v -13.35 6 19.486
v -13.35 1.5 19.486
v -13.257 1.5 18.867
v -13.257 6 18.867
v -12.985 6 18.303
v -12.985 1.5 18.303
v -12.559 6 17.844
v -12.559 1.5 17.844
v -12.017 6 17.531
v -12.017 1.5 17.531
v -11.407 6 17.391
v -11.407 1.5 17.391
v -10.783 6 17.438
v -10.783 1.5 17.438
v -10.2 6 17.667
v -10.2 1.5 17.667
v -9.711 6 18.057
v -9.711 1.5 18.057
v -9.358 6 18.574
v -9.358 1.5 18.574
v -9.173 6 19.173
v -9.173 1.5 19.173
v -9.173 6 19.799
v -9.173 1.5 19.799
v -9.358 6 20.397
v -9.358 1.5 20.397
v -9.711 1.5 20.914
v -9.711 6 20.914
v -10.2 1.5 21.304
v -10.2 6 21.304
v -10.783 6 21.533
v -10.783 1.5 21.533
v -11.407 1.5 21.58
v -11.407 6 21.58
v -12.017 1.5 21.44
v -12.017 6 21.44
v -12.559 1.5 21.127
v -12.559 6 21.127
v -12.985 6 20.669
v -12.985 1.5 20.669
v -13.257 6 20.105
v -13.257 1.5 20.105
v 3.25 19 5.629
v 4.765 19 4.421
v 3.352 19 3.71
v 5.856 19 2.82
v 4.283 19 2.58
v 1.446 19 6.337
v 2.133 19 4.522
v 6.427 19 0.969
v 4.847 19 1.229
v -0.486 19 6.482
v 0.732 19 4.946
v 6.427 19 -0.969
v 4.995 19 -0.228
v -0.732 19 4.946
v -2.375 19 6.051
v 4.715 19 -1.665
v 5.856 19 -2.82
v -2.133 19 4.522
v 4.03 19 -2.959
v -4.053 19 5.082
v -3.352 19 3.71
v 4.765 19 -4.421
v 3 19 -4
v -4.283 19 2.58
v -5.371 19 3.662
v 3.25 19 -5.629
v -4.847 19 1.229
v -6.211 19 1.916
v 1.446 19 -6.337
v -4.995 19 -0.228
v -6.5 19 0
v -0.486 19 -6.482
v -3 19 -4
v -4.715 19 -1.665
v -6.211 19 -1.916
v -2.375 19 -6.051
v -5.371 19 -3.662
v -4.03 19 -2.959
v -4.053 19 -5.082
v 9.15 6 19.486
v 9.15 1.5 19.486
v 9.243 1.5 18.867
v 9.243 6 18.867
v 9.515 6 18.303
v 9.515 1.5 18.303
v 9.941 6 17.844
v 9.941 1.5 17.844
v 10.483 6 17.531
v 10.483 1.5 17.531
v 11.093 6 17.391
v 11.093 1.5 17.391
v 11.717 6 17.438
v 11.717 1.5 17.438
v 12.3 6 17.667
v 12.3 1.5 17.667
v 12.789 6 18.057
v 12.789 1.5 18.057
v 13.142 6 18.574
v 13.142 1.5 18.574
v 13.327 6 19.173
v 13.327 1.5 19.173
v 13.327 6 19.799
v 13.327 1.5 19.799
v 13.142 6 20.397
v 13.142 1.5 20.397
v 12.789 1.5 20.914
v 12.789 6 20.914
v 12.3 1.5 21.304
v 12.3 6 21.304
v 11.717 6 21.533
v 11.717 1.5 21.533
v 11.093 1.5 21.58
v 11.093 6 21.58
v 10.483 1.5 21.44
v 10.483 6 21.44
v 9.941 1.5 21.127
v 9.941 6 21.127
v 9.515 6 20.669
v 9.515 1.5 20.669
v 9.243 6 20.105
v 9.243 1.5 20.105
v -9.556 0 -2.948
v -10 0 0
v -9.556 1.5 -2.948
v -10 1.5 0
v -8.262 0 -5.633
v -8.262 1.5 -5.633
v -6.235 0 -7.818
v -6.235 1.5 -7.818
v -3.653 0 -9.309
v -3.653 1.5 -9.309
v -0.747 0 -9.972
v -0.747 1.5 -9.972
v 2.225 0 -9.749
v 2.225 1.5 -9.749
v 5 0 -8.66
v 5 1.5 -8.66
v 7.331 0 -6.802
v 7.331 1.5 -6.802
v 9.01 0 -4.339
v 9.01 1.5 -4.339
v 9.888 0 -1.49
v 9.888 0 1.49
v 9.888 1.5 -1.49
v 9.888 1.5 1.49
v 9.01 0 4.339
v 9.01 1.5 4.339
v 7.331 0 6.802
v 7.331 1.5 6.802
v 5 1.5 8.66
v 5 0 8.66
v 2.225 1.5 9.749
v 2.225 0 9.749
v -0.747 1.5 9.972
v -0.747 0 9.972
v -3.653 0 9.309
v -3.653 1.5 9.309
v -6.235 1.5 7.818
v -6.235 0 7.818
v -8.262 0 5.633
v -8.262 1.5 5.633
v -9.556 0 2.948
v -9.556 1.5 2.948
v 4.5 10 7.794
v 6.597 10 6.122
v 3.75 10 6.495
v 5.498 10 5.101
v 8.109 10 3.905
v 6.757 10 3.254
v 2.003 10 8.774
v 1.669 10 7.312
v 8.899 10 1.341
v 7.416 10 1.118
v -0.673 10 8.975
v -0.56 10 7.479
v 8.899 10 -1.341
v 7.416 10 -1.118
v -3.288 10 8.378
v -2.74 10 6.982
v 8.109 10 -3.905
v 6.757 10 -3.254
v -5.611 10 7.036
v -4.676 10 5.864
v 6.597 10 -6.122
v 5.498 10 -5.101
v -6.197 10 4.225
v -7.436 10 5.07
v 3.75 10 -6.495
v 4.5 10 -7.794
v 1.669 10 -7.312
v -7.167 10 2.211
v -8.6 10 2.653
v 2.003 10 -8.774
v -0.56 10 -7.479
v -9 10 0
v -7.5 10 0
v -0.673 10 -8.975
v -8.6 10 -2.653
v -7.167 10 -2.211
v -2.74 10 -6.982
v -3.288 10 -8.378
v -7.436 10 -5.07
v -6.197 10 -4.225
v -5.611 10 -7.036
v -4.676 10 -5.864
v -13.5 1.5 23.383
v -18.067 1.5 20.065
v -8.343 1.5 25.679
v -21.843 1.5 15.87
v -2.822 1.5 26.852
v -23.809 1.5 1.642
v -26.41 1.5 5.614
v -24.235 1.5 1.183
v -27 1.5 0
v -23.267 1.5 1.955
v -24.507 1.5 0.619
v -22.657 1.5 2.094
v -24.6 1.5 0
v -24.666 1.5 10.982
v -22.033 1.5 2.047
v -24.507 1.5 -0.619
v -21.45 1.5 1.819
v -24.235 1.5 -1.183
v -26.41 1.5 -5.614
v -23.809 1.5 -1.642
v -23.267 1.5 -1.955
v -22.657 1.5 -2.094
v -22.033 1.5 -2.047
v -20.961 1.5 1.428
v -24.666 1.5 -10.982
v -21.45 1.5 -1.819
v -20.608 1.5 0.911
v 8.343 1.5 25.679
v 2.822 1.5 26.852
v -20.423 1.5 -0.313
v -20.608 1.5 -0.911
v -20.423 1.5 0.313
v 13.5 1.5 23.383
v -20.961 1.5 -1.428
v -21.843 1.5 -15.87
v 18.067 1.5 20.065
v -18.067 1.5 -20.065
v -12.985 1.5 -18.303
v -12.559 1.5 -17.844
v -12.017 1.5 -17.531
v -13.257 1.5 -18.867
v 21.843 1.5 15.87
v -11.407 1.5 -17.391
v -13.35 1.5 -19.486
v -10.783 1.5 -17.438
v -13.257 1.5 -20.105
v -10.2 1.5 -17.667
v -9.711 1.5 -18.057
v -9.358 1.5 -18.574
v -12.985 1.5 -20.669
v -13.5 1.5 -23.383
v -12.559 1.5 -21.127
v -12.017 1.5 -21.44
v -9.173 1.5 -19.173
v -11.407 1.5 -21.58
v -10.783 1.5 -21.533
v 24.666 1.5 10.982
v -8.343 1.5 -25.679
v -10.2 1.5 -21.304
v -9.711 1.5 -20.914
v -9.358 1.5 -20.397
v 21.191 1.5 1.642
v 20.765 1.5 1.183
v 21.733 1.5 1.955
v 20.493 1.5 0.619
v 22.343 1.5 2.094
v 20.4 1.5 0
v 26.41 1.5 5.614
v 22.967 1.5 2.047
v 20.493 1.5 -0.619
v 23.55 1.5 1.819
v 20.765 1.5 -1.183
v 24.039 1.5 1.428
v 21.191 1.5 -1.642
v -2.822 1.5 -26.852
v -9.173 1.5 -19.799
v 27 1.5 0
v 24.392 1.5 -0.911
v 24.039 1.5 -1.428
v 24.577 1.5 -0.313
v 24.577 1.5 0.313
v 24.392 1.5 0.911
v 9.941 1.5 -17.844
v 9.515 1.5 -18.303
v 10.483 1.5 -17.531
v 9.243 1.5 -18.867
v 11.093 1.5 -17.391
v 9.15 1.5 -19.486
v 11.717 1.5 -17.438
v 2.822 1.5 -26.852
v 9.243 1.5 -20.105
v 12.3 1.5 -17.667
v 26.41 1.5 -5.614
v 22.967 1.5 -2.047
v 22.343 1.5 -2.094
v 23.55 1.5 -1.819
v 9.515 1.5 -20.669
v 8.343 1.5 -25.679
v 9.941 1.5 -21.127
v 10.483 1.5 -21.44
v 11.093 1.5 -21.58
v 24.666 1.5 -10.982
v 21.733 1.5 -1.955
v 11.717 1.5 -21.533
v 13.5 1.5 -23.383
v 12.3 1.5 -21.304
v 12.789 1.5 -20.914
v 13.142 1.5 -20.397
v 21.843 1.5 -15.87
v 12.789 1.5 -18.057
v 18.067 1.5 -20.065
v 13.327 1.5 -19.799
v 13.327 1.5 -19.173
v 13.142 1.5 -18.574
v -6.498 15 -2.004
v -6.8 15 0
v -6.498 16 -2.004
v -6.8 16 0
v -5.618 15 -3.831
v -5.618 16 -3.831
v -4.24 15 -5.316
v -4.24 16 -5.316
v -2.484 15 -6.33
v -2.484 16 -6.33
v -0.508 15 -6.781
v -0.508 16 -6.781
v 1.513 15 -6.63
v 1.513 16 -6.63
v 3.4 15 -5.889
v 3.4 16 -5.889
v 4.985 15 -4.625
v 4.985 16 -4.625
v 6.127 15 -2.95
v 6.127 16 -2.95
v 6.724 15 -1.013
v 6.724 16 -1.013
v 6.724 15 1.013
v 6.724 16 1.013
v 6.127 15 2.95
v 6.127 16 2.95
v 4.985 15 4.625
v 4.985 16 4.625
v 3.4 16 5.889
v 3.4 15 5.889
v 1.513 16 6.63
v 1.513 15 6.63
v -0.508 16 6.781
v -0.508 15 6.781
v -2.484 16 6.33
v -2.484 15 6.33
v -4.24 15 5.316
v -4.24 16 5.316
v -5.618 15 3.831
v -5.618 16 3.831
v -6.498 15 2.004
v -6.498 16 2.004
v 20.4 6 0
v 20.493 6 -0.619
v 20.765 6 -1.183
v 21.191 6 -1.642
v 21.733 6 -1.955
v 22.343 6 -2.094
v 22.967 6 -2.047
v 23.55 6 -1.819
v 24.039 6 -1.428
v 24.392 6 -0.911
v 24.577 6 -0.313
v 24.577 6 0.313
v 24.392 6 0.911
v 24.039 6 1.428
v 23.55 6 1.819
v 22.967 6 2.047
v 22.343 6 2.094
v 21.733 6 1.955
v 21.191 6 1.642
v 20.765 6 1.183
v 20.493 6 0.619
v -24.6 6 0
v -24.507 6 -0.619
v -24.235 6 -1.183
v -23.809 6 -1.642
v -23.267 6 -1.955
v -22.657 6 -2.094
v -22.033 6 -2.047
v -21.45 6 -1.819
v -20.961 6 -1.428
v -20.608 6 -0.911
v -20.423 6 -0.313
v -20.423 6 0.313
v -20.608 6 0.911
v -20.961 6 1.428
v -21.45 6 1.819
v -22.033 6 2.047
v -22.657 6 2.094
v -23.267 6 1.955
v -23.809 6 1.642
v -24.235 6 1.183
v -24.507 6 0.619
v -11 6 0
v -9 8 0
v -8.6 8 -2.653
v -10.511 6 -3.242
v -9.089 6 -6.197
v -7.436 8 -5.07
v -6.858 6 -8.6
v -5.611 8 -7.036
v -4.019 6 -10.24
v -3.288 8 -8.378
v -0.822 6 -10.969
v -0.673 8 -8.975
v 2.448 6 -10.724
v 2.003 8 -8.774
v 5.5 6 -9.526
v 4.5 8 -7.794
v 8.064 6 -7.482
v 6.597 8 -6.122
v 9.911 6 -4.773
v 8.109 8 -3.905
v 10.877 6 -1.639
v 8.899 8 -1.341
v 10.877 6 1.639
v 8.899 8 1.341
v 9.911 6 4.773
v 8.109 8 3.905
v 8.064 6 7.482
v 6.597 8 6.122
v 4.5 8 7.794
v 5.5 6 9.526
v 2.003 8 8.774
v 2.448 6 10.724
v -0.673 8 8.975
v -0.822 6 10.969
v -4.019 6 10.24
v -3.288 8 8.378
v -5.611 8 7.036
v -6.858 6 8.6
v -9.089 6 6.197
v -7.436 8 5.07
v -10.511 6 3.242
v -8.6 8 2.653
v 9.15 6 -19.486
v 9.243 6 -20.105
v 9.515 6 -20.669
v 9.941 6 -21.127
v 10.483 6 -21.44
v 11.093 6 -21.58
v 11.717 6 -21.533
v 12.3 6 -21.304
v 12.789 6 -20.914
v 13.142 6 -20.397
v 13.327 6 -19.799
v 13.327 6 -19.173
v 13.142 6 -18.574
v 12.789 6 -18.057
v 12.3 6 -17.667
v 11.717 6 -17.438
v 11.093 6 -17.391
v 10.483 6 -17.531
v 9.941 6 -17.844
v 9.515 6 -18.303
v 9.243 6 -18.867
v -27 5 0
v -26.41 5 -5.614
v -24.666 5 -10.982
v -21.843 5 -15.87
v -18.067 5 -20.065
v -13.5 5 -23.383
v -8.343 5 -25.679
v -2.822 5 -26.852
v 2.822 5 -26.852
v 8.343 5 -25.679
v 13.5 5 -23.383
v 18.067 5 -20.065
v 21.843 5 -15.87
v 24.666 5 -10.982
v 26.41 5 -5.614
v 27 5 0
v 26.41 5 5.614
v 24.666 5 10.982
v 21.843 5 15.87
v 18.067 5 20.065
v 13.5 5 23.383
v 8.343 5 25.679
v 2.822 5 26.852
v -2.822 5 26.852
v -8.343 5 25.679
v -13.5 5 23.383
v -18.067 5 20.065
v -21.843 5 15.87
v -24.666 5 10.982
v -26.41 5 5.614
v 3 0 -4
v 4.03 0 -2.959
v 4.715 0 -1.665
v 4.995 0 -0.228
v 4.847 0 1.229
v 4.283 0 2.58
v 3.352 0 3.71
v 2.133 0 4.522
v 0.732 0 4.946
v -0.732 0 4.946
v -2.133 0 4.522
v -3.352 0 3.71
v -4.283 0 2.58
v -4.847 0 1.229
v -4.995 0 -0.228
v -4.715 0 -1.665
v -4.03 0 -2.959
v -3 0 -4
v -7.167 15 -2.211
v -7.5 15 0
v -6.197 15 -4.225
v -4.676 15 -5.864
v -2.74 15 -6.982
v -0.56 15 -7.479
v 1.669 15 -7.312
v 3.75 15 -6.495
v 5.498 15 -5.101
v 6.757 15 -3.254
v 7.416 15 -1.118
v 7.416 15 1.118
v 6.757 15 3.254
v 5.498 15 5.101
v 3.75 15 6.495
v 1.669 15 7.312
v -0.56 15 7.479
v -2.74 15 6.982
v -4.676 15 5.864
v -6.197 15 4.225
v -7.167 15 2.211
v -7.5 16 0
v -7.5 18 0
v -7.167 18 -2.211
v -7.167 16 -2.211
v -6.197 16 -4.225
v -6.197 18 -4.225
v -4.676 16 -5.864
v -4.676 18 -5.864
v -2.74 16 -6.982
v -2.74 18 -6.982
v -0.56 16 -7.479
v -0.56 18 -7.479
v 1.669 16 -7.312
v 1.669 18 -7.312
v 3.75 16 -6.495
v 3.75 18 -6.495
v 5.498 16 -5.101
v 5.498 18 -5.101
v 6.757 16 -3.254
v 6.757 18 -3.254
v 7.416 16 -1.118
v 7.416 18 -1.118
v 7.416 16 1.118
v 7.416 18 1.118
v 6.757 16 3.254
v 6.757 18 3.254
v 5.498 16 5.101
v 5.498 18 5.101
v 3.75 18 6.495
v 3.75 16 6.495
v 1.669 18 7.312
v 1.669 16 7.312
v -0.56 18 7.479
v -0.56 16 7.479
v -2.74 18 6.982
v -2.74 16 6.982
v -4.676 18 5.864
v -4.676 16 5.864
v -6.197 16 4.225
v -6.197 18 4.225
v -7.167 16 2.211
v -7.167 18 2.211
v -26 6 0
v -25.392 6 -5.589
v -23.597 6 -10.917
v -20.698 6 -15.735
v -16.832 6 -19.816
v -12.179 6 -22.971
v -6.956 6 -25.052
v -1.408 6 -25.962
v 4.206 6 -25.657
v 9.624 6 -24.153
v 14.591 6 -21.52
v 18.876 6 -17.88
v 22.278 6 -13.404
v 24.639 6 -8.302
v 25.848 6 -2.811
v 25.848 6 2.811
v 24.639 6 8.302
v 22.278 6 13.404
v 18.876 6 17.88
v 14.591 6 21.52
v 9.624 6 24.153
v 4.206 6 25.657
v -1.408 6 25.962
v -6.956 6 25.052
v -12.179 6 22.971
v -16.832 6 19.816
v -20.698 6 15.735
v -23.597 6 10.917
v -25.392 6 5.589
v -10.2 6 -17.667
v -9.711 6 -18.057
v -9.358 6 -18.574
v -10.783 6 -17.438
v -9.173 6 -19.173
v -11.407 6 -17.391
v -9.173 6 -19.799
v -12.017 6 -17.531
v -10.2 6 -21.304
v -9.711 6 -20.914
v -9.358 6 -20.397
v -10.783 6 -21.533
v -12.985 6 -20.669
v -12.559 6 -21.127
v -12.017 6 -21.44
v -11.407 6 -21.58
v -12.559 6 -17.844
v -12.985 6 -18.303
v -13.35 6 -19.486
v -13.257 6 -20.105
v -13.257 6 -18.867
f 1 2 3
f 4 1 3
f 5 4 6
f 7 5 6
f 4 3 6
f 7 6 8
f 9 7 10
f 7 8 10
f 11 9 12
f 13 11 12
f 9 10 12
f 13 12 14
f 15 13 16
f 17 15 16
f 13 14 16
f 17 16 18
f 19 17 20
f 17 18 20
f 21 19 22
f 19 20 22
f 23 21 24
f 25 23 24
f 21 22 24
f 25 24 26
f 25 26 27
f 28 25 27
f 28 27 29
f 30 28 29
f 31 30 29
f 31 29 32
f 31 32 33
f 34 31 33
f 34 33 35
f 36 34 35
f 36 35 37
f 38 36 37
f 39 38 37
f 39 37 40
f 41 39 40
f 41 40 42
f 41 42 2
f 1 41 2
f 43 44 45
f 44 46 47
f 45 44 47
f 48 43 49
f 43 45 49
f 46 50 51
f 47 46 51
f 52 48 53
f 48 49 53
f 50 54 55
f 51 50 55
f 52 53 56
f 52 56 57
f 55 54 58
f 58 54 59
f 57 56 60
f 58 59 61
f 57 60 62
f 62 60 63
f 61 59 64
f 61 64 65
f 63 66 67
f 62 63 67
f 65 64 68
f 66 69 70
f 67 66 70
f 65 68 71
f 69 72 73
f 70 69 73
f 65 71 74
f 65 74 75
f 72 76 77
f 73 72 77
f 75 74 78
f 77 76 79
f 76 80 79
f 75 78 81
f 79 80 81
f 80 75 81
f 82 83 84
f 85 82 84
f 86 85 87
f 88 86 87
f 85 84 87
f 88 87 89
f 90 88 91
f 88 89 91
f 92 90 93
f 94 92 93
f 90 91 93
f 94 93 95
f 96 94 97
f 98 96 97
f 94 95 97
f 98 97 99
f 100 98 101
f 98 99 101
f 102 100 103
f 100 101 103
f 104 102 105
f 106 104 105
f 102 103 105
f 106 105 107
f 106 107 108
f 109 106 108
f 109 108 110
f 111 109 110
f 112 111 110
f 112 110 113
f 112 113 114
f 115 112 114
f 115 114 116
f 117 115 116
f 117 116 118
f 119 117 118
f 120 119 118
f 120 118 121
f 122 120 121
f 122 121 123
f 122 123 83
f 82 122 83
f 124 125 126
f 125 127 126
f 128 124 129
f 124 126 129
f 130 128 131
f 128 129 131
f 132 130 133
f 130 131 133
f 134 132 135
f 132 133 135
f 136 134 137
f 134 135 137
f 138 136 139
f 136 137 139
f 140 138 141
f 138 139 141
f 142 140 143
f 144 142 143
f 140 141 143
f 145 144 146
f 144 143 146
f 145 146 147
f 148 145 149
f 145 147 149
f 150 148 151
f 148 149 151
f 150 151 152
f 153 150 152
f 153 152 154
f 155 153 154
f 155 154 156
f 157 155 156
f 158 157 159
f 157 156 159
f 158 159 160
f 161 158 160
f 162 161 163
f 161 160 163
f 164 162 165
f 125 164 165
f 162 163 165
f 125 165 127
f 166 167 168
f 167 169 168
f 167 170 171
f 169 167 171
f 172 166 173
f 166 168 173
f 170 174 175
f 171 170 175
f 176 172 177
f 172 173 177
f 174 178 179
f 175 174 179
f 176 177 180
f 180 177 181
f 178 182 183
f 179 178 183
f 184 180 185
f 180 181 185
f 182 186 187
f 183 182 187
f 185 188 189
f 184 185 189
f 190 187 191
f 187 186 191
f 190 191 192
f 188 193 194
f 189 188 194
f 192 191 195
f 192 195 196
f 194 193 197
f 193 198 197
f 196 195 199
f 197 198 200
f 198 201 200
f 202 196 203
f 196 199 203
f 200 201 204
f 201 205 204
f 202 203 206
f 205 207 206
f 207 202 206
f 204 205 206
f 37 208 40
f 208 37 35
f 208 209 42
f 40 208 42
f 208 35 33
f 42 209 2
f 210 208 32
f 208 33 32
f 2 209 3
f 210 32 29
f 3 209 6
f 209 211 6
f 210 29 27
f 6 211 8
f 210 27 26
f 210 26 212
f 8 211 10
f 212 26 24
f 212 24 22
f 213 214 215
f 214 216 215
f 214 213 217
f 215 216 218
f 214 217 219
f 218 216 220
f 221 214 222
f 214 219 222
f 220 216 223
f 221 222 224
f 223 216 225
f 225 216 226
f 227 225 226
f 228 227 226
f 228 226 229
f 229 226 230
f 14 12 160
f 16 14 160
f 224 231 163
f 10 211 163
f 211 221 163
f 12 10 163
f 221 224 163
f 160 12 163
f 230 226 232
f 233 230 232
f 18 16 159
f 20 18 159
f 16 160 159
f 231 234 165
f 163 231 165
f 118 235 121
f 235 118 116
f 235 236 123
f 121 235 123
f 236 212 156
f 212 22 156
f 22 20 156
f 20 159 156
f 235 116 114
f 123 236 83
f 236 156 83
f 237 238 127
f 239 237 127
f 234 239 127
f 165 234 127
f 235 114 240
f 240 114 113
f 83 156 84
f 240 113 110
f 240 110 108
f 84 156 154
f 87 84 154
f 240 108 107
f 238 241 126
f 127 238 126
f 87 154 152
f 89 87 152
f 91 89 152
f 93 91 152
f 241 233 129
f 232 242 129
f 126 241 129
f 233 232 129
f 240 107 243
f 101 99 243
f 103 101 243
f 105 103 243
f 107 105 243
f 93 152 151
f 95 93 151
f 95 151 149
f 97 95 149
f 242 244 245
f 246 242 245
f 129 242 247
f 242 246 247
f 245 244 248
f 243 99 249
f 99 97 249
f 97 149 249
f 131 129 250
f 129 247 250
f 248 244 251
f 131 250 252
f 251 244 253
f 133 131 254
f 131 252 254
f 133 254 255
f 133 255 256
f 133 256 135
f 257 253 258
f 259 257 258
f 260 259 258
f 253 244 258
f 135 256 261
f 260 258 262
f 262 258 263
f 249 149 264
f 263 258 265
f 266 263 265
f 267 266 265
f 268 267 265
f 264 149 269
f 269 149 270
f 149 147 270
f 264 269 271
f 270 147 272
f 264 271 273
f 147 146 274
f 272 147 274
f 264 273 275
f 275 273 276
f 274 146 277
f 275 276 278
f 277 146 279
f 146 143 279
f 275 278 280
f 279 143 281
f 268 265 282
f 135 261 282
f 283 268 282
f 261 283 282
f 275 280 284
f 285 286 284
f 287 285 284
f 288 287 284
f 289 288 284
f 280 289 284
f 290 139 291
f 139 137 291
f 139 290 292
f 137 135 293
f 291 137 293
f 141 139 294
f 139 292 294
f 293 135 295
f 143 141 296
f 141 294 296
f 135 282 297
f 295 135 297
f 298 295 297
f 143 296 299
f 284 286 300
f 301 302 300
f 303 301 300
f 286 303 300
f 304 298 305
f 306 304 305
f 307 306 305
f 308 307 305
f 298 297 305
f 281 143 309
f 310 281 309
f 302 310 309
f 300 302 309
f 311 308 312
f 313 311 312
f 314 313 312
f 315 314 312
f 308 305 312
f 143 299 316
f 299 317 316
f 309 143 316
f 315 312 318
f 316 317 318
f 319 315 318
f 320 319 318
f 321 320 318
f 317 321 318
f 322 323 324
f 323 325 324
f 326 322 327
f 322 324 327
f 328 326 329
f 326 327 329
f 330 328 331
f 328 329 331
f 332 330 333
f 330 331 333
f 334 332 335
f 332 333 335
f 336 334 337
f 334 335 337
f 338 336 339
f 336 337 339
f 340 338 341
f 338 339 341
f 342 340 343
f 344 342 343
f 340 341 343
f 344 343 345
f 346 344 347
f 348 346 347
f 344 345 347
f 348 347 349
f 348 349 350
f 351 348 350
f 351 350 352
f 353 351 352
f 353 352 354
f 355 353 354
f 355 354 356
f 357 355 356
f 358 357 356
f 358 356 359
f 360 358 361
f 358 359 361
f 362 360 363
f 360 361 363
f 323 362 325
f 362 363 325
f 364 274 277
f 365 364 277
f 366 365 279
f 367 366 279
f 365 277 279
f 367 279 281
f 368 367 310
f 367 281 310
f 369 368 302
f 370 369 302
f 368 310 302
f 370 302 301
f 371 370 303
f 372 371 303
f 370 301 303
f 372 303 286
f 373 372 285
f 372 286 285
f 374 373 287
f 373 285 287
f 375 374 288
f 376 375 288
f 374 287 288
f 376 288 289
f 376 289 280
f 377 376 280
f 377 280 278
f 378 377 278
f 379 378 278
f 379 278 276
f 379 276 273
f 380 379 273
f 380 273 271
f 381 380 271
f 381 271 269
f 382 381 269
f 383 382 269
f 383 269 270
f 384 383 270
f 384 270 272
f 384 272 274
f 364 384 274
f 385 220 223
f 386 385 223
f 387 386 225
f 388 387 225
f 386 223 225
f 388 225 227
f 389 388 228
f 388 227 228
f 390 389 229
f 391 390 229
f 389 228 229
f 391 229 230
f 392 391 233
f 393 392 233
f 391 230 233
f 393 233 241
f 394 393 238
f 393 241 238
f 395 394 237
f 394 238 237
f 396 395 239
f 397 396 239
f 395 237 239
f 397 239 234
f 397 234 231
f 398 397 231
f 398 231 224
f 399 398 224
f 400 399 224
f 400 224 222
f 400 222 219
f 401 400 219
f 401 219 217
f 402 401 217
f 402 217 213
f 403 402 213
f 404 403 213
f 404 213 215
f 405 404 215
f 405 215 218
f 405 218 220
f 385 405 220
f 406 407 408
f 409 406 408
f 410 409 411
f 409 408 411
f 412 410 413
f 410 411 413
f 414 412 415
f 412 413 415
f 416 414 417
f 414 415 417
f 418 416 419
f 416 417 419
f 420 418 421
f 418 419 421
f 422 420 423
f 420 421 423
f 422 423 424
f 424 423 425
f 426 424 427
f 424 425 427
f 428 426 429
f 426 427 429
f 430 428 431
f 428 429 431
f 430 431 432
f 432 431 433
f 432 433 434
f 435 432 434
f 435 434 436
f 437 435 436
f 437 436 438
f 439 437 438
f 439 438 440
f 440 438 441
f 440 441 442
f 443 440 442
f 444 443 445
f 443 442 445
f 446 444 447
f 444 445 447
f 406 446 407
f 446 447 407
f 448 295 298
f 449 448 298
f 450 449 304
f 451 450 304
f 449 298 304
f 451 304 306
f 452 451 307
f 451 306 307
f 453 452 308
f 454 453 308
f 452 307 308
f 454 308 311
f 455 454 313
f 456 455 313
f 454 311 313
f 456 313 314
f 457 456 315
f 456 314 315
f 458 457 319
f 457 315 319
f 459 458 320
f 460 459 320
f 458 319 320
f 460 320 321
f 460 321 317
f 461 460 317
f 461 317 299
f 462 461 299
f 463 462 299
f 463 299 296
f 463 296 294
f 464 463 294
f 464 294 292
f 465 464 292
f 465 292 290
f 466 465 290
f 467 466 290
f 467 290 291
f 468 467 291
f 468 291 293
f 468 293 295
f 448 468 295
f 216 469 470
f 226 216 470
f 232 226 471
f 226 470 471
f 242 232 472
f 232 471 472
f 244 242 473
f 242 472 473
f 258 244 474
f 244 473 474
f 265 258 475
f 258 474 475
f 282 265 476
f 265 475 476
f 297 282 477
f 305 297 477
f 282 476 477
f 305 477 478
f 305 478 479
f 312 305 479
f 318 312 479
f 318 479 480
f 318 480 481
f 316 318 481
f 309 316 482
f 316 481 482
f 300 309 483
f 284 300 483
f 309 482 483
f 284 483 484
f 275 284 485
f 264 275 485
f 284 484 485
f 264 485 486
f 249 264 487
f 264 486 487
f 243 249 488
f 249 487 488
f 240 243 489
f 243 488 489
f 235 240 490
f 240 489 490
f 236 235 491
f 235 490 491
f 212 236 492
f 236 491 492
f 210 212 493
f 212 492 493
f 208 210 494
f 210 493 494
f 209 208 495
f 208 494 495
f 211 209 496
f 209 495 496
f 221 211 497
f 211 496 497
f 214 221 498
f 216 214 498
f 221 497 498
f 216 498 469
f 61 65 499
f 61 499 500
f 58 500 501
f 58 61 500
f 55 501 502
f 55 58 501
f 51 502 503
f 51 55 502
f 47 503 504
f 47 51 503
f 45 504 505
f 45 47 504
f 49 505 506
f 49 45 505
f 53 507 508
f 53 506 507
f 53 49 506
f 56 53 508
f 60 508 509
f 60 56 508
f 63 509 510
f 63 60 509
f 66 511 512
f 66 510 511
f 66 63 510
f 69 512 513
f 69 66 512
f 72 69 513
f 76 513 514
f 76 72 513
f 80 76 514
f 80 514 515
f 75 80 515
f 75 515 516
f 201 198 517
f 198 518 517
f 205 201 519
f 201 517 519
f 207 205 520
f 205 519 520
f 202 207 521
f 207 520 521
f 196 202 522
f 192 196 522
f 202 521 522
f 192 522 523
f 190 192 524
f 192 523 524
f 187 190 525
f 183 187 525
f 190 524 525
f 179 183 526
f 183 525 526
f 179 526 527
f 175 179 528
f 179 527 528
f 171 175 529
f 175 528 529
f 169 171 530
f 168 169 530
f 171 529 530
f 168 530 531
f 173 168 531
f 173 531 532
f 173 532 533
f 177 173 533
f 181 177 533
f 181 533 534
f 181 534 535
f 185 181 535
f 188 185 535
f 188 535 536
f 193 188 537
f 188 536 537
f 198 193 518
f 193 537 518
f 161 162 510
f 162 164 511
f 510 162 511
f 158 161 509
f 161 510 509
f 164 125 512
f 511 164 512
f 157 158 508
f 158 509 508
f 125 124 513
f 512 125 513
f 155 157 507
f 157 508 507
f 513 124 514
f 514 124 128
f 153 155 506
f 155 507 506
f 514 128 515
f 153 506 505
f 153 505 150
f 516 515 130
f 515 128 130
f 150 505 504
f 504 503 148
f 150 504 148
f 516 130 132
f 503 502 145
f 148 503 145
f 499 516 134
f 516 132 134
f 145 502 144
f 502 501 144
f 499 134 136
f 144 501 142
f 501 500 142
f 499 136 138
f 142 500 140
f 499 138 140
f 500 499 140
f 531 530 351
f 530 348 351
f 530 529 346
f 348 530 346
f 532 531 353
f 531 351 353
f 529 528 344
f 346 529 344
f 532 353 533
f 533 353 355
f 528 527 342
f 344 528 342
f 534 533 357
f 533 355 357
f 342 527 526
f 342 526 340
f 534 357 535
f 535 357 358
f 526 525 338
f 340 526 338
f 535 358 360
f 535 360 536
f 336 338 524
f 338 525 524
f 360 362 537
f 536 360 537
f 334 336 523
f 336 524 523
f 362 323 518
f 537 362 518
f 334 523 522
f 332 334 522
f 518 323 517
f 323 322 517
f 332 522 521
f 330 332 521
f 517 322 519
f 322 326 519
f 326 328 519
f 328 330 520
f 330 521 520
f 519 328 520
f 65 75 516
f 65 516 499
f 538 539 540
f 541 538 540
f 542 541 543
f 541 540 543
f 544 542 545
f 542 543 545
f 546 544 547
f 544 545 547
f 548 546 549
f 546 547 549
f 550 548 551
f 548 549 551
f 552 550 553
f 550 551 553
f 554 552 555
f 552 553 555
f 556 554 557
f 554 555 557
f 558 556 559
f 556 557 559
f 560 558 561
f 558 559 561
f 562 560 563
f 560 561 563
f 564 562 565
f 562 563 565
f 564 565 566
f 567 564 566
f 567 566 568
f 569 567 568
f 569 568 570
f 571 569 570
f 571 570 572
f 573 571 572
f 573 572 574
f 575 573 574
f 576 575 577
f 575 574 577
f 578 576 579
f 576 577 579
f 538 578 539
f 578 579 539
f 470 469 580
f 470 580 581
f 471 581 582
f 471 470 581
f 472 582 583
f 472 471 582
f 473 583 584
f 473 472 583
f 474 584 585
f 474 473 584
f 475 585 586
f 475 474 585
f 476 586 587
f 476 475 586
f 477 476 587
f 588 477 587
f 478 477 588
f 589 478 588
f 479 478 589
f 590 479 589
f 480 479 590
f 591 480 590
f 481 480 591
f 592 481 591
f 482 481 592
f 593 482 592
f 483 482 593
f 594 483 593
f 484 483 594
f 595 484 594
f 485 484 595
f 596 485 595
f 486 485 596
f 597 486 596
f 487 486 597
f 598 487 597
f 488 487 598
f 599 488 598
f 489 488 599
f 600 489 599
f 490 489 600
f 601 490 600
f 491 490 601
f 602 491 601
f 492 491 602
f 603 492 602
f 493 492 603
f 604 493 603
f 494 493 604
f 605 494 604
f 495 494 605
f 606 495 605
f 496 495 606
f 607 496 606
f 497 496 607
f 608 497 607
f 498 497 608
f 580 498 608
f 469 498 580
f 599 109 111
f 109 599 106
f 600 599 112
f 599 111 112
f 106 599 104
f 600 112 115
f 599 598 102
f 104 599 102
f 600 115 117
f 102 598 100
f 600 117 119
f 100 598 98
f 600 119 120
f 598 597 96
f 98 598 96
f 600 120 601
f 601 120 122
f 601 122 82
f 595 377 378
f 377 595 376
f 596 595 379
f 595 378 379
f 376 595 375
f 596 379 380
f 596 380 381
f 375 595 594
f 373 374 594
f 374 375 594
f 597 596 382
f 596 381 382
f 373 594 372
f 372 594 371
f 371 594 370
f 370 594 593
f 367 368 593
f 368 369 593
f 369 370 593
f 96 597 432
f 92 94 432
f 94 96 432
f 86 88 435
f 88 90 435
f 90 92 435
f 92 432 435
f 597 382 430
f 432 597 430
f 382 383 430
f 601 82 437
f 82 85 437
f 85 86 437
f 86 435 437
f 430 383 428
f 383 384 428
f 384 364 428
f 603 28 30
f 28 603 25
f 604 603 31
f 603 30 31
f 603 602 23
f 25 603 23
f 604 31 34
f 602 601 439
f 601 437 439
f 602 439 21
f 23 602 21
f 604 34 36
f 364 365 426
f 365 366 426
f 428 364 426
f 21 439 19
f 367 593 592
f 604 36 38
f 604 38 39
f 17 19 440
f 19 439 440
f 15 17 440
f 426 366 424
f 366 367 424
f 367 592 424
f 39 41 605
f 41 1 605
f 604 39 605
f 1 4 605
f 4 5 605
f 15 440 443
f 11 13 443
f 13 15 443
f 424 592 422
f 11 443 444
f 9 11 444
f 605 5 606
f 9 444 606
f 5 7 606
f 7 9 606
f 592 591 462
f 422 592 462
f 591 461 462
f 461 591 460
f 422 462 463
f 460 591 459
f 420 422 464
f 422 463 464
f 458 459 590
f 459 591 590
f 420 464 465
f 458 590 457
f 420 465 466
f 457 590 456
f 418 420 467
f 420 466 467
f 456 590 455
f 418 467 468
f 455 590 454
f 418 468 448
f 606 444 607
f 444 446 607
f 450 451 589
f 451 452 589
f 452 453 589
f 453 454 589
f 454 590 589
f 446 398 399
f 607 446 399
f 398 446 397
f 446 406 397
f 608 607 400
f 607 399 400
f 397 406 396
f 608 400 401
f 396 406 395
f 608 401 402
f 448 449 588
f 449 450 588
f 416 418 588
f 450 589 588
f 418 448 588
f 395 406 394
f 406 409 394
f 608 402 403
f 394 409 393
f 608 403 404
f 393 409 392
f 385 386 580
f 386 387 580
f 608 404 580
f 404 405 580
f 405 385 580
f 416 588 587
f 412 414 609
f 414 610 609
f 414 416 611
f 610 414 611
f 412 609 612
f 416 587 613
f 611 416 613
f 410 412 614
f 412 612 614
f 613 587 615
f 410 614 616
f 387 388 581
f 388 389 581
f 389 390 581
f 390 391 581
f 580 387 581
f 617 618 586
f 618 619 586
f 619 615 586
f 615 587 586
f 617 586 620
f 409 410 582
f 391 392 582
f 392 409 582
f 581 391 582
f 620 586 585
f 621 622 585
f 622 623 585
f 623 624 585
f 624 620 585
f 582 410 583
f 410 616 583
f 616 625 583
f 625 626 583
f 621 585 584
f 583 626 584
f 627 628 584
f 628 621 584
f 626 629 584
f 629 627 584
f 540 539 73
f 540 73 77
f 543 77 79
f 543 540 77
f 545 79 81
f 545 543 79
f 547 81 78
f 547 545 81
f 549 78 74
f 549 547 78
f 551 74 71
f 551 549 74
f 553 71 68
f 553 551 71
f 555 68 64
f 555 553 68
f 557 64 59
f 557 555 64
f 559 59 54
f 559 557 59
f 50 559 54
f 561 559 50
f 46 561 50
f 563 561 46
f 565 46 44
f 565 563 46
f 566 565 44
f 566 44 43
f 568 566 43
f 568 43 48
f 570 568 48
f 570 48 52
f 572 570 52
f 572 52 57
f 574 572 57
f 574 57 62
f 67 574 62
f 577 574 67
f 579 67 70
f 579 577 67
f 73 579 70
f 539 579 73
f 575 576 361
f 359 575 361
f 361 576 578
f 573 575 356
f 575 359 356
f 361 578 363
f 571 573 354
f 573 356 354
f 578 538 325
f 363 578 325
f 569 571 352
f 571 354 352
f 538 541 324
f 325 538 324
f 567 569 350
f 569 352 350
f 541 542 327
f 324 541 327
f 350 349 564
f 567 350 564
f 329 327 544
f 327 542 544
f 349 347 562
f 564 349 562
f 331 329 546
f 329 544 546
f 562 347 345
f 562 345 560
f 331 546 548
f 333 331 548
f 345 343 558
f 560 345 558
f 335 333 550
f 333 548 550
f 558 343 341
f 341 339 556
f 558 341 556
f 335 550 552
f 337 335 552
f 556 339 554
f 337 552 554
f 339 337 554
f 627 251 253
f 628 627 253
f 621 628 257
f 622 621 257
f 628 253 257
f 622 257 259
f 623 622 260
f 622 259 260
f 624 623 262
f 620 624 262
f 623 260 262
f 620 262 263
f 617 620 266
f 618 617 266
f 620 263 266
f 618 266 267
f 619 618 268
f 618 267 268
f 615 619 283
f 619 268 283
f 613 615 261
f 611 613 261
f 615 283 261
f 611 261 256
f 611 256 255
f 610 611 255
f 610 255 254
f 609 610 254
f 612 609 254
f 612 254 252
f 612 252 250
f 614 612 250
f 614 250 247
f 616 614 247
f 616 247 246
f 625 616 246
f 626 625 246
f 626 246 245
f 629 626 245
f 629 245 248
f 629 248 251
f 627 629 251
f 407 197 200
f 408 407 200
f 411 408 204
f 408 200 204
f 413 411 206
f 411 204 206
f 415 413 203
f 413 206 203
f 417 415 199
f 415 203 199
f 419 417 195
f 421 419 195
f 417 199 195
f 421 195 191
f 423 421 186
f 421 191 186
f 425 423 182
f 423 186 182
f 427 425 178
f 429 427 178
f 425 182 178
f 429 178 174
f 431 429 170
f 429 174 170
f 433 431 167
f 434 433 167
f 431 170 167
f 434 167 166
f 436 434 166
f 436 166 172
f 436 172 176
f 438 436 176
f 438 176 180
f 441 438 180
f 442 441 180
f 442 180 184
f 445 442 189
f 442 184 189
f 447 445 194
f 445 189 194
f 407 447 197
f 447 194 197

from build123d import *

# Parameters (mm, degrees)
CUT_EXTRUDE_1_DEPTH = 43.649736224
HOLE_WIZARD_M5_1_D  = 4.2
CHAMFER_1_SIZE      = 2
CHAMFER_2_SIZE      = 1


with BuildPart() as part:
    # 草图1 → 旋转1 (revolve)
    with BuildSketch(Plane.XY, mode=Mode.PRIVATE) as revolve_1_sk:
        Polygon((0, 19), (0, 0), (10, 0), (10, 1.5), (27, 1.5), (27, 6), (9, 6), (9, 10), (7.5, 10), (7.5, 15), (6.8, 15), (6.8, 16), (7.5, 16), (7.5, 19), align=None)
    revolve(revolve_1_sk.sketch.rotate(Axis((0, 19, 0), (0, -1, 0)), 180), axis=Axis((0, 19, 0), (0, -1, 0)))

    # 草图2 → 切除-拉伸1 (cut, through all)
    with BuildSketch(Plane(origin=(0, 19, 0), x_dir=(1, 0, 0), z_dir=(0, 1, 0))):
        with BuildLine():
            Line((-3, 4), (3, 4))
            ThreePointArc((3, 4), (0, -5), (-3, 4))
        make_face()
    extrude(amount=-CUT_EXTRUDE_1_DEPTH, mode=Mode.SUBTRACT)

    # M5 螺纹孔1 (through all)
    with Locations(Plane(origin=(0, 6, 0), x_dir=(1, 0, 0), z_dir=(0, 1, 0))):
        with Locations((-11.25, 19.485571585), (11.25, 19.485571585), (22.5, 0), (11.25, -19.485571585), (-11.25, -19.485571585), (-22.5, 0)):
            Hole(HOLE_WIZARD_M5_1_D / 2)

    # 倒角1
    chamfer_1_edges = [part.edges().sort_by_distance(p)[0] for p in [
        (9, 6, 0),
    ]]
    chamfer(chamfer_1_edges, length=CHAMFER_1_SIZE)

    # 倒角2
    chamfer_2_edges = [part.edges().sort_by_distance(p)[0] for p in [
        (27, 6, 0),
        (7.5, 19, 0),
    ]]
    chamfer(chamfer_2_edges, length=CHAMFER_2_SIZE)


solid = part.part
